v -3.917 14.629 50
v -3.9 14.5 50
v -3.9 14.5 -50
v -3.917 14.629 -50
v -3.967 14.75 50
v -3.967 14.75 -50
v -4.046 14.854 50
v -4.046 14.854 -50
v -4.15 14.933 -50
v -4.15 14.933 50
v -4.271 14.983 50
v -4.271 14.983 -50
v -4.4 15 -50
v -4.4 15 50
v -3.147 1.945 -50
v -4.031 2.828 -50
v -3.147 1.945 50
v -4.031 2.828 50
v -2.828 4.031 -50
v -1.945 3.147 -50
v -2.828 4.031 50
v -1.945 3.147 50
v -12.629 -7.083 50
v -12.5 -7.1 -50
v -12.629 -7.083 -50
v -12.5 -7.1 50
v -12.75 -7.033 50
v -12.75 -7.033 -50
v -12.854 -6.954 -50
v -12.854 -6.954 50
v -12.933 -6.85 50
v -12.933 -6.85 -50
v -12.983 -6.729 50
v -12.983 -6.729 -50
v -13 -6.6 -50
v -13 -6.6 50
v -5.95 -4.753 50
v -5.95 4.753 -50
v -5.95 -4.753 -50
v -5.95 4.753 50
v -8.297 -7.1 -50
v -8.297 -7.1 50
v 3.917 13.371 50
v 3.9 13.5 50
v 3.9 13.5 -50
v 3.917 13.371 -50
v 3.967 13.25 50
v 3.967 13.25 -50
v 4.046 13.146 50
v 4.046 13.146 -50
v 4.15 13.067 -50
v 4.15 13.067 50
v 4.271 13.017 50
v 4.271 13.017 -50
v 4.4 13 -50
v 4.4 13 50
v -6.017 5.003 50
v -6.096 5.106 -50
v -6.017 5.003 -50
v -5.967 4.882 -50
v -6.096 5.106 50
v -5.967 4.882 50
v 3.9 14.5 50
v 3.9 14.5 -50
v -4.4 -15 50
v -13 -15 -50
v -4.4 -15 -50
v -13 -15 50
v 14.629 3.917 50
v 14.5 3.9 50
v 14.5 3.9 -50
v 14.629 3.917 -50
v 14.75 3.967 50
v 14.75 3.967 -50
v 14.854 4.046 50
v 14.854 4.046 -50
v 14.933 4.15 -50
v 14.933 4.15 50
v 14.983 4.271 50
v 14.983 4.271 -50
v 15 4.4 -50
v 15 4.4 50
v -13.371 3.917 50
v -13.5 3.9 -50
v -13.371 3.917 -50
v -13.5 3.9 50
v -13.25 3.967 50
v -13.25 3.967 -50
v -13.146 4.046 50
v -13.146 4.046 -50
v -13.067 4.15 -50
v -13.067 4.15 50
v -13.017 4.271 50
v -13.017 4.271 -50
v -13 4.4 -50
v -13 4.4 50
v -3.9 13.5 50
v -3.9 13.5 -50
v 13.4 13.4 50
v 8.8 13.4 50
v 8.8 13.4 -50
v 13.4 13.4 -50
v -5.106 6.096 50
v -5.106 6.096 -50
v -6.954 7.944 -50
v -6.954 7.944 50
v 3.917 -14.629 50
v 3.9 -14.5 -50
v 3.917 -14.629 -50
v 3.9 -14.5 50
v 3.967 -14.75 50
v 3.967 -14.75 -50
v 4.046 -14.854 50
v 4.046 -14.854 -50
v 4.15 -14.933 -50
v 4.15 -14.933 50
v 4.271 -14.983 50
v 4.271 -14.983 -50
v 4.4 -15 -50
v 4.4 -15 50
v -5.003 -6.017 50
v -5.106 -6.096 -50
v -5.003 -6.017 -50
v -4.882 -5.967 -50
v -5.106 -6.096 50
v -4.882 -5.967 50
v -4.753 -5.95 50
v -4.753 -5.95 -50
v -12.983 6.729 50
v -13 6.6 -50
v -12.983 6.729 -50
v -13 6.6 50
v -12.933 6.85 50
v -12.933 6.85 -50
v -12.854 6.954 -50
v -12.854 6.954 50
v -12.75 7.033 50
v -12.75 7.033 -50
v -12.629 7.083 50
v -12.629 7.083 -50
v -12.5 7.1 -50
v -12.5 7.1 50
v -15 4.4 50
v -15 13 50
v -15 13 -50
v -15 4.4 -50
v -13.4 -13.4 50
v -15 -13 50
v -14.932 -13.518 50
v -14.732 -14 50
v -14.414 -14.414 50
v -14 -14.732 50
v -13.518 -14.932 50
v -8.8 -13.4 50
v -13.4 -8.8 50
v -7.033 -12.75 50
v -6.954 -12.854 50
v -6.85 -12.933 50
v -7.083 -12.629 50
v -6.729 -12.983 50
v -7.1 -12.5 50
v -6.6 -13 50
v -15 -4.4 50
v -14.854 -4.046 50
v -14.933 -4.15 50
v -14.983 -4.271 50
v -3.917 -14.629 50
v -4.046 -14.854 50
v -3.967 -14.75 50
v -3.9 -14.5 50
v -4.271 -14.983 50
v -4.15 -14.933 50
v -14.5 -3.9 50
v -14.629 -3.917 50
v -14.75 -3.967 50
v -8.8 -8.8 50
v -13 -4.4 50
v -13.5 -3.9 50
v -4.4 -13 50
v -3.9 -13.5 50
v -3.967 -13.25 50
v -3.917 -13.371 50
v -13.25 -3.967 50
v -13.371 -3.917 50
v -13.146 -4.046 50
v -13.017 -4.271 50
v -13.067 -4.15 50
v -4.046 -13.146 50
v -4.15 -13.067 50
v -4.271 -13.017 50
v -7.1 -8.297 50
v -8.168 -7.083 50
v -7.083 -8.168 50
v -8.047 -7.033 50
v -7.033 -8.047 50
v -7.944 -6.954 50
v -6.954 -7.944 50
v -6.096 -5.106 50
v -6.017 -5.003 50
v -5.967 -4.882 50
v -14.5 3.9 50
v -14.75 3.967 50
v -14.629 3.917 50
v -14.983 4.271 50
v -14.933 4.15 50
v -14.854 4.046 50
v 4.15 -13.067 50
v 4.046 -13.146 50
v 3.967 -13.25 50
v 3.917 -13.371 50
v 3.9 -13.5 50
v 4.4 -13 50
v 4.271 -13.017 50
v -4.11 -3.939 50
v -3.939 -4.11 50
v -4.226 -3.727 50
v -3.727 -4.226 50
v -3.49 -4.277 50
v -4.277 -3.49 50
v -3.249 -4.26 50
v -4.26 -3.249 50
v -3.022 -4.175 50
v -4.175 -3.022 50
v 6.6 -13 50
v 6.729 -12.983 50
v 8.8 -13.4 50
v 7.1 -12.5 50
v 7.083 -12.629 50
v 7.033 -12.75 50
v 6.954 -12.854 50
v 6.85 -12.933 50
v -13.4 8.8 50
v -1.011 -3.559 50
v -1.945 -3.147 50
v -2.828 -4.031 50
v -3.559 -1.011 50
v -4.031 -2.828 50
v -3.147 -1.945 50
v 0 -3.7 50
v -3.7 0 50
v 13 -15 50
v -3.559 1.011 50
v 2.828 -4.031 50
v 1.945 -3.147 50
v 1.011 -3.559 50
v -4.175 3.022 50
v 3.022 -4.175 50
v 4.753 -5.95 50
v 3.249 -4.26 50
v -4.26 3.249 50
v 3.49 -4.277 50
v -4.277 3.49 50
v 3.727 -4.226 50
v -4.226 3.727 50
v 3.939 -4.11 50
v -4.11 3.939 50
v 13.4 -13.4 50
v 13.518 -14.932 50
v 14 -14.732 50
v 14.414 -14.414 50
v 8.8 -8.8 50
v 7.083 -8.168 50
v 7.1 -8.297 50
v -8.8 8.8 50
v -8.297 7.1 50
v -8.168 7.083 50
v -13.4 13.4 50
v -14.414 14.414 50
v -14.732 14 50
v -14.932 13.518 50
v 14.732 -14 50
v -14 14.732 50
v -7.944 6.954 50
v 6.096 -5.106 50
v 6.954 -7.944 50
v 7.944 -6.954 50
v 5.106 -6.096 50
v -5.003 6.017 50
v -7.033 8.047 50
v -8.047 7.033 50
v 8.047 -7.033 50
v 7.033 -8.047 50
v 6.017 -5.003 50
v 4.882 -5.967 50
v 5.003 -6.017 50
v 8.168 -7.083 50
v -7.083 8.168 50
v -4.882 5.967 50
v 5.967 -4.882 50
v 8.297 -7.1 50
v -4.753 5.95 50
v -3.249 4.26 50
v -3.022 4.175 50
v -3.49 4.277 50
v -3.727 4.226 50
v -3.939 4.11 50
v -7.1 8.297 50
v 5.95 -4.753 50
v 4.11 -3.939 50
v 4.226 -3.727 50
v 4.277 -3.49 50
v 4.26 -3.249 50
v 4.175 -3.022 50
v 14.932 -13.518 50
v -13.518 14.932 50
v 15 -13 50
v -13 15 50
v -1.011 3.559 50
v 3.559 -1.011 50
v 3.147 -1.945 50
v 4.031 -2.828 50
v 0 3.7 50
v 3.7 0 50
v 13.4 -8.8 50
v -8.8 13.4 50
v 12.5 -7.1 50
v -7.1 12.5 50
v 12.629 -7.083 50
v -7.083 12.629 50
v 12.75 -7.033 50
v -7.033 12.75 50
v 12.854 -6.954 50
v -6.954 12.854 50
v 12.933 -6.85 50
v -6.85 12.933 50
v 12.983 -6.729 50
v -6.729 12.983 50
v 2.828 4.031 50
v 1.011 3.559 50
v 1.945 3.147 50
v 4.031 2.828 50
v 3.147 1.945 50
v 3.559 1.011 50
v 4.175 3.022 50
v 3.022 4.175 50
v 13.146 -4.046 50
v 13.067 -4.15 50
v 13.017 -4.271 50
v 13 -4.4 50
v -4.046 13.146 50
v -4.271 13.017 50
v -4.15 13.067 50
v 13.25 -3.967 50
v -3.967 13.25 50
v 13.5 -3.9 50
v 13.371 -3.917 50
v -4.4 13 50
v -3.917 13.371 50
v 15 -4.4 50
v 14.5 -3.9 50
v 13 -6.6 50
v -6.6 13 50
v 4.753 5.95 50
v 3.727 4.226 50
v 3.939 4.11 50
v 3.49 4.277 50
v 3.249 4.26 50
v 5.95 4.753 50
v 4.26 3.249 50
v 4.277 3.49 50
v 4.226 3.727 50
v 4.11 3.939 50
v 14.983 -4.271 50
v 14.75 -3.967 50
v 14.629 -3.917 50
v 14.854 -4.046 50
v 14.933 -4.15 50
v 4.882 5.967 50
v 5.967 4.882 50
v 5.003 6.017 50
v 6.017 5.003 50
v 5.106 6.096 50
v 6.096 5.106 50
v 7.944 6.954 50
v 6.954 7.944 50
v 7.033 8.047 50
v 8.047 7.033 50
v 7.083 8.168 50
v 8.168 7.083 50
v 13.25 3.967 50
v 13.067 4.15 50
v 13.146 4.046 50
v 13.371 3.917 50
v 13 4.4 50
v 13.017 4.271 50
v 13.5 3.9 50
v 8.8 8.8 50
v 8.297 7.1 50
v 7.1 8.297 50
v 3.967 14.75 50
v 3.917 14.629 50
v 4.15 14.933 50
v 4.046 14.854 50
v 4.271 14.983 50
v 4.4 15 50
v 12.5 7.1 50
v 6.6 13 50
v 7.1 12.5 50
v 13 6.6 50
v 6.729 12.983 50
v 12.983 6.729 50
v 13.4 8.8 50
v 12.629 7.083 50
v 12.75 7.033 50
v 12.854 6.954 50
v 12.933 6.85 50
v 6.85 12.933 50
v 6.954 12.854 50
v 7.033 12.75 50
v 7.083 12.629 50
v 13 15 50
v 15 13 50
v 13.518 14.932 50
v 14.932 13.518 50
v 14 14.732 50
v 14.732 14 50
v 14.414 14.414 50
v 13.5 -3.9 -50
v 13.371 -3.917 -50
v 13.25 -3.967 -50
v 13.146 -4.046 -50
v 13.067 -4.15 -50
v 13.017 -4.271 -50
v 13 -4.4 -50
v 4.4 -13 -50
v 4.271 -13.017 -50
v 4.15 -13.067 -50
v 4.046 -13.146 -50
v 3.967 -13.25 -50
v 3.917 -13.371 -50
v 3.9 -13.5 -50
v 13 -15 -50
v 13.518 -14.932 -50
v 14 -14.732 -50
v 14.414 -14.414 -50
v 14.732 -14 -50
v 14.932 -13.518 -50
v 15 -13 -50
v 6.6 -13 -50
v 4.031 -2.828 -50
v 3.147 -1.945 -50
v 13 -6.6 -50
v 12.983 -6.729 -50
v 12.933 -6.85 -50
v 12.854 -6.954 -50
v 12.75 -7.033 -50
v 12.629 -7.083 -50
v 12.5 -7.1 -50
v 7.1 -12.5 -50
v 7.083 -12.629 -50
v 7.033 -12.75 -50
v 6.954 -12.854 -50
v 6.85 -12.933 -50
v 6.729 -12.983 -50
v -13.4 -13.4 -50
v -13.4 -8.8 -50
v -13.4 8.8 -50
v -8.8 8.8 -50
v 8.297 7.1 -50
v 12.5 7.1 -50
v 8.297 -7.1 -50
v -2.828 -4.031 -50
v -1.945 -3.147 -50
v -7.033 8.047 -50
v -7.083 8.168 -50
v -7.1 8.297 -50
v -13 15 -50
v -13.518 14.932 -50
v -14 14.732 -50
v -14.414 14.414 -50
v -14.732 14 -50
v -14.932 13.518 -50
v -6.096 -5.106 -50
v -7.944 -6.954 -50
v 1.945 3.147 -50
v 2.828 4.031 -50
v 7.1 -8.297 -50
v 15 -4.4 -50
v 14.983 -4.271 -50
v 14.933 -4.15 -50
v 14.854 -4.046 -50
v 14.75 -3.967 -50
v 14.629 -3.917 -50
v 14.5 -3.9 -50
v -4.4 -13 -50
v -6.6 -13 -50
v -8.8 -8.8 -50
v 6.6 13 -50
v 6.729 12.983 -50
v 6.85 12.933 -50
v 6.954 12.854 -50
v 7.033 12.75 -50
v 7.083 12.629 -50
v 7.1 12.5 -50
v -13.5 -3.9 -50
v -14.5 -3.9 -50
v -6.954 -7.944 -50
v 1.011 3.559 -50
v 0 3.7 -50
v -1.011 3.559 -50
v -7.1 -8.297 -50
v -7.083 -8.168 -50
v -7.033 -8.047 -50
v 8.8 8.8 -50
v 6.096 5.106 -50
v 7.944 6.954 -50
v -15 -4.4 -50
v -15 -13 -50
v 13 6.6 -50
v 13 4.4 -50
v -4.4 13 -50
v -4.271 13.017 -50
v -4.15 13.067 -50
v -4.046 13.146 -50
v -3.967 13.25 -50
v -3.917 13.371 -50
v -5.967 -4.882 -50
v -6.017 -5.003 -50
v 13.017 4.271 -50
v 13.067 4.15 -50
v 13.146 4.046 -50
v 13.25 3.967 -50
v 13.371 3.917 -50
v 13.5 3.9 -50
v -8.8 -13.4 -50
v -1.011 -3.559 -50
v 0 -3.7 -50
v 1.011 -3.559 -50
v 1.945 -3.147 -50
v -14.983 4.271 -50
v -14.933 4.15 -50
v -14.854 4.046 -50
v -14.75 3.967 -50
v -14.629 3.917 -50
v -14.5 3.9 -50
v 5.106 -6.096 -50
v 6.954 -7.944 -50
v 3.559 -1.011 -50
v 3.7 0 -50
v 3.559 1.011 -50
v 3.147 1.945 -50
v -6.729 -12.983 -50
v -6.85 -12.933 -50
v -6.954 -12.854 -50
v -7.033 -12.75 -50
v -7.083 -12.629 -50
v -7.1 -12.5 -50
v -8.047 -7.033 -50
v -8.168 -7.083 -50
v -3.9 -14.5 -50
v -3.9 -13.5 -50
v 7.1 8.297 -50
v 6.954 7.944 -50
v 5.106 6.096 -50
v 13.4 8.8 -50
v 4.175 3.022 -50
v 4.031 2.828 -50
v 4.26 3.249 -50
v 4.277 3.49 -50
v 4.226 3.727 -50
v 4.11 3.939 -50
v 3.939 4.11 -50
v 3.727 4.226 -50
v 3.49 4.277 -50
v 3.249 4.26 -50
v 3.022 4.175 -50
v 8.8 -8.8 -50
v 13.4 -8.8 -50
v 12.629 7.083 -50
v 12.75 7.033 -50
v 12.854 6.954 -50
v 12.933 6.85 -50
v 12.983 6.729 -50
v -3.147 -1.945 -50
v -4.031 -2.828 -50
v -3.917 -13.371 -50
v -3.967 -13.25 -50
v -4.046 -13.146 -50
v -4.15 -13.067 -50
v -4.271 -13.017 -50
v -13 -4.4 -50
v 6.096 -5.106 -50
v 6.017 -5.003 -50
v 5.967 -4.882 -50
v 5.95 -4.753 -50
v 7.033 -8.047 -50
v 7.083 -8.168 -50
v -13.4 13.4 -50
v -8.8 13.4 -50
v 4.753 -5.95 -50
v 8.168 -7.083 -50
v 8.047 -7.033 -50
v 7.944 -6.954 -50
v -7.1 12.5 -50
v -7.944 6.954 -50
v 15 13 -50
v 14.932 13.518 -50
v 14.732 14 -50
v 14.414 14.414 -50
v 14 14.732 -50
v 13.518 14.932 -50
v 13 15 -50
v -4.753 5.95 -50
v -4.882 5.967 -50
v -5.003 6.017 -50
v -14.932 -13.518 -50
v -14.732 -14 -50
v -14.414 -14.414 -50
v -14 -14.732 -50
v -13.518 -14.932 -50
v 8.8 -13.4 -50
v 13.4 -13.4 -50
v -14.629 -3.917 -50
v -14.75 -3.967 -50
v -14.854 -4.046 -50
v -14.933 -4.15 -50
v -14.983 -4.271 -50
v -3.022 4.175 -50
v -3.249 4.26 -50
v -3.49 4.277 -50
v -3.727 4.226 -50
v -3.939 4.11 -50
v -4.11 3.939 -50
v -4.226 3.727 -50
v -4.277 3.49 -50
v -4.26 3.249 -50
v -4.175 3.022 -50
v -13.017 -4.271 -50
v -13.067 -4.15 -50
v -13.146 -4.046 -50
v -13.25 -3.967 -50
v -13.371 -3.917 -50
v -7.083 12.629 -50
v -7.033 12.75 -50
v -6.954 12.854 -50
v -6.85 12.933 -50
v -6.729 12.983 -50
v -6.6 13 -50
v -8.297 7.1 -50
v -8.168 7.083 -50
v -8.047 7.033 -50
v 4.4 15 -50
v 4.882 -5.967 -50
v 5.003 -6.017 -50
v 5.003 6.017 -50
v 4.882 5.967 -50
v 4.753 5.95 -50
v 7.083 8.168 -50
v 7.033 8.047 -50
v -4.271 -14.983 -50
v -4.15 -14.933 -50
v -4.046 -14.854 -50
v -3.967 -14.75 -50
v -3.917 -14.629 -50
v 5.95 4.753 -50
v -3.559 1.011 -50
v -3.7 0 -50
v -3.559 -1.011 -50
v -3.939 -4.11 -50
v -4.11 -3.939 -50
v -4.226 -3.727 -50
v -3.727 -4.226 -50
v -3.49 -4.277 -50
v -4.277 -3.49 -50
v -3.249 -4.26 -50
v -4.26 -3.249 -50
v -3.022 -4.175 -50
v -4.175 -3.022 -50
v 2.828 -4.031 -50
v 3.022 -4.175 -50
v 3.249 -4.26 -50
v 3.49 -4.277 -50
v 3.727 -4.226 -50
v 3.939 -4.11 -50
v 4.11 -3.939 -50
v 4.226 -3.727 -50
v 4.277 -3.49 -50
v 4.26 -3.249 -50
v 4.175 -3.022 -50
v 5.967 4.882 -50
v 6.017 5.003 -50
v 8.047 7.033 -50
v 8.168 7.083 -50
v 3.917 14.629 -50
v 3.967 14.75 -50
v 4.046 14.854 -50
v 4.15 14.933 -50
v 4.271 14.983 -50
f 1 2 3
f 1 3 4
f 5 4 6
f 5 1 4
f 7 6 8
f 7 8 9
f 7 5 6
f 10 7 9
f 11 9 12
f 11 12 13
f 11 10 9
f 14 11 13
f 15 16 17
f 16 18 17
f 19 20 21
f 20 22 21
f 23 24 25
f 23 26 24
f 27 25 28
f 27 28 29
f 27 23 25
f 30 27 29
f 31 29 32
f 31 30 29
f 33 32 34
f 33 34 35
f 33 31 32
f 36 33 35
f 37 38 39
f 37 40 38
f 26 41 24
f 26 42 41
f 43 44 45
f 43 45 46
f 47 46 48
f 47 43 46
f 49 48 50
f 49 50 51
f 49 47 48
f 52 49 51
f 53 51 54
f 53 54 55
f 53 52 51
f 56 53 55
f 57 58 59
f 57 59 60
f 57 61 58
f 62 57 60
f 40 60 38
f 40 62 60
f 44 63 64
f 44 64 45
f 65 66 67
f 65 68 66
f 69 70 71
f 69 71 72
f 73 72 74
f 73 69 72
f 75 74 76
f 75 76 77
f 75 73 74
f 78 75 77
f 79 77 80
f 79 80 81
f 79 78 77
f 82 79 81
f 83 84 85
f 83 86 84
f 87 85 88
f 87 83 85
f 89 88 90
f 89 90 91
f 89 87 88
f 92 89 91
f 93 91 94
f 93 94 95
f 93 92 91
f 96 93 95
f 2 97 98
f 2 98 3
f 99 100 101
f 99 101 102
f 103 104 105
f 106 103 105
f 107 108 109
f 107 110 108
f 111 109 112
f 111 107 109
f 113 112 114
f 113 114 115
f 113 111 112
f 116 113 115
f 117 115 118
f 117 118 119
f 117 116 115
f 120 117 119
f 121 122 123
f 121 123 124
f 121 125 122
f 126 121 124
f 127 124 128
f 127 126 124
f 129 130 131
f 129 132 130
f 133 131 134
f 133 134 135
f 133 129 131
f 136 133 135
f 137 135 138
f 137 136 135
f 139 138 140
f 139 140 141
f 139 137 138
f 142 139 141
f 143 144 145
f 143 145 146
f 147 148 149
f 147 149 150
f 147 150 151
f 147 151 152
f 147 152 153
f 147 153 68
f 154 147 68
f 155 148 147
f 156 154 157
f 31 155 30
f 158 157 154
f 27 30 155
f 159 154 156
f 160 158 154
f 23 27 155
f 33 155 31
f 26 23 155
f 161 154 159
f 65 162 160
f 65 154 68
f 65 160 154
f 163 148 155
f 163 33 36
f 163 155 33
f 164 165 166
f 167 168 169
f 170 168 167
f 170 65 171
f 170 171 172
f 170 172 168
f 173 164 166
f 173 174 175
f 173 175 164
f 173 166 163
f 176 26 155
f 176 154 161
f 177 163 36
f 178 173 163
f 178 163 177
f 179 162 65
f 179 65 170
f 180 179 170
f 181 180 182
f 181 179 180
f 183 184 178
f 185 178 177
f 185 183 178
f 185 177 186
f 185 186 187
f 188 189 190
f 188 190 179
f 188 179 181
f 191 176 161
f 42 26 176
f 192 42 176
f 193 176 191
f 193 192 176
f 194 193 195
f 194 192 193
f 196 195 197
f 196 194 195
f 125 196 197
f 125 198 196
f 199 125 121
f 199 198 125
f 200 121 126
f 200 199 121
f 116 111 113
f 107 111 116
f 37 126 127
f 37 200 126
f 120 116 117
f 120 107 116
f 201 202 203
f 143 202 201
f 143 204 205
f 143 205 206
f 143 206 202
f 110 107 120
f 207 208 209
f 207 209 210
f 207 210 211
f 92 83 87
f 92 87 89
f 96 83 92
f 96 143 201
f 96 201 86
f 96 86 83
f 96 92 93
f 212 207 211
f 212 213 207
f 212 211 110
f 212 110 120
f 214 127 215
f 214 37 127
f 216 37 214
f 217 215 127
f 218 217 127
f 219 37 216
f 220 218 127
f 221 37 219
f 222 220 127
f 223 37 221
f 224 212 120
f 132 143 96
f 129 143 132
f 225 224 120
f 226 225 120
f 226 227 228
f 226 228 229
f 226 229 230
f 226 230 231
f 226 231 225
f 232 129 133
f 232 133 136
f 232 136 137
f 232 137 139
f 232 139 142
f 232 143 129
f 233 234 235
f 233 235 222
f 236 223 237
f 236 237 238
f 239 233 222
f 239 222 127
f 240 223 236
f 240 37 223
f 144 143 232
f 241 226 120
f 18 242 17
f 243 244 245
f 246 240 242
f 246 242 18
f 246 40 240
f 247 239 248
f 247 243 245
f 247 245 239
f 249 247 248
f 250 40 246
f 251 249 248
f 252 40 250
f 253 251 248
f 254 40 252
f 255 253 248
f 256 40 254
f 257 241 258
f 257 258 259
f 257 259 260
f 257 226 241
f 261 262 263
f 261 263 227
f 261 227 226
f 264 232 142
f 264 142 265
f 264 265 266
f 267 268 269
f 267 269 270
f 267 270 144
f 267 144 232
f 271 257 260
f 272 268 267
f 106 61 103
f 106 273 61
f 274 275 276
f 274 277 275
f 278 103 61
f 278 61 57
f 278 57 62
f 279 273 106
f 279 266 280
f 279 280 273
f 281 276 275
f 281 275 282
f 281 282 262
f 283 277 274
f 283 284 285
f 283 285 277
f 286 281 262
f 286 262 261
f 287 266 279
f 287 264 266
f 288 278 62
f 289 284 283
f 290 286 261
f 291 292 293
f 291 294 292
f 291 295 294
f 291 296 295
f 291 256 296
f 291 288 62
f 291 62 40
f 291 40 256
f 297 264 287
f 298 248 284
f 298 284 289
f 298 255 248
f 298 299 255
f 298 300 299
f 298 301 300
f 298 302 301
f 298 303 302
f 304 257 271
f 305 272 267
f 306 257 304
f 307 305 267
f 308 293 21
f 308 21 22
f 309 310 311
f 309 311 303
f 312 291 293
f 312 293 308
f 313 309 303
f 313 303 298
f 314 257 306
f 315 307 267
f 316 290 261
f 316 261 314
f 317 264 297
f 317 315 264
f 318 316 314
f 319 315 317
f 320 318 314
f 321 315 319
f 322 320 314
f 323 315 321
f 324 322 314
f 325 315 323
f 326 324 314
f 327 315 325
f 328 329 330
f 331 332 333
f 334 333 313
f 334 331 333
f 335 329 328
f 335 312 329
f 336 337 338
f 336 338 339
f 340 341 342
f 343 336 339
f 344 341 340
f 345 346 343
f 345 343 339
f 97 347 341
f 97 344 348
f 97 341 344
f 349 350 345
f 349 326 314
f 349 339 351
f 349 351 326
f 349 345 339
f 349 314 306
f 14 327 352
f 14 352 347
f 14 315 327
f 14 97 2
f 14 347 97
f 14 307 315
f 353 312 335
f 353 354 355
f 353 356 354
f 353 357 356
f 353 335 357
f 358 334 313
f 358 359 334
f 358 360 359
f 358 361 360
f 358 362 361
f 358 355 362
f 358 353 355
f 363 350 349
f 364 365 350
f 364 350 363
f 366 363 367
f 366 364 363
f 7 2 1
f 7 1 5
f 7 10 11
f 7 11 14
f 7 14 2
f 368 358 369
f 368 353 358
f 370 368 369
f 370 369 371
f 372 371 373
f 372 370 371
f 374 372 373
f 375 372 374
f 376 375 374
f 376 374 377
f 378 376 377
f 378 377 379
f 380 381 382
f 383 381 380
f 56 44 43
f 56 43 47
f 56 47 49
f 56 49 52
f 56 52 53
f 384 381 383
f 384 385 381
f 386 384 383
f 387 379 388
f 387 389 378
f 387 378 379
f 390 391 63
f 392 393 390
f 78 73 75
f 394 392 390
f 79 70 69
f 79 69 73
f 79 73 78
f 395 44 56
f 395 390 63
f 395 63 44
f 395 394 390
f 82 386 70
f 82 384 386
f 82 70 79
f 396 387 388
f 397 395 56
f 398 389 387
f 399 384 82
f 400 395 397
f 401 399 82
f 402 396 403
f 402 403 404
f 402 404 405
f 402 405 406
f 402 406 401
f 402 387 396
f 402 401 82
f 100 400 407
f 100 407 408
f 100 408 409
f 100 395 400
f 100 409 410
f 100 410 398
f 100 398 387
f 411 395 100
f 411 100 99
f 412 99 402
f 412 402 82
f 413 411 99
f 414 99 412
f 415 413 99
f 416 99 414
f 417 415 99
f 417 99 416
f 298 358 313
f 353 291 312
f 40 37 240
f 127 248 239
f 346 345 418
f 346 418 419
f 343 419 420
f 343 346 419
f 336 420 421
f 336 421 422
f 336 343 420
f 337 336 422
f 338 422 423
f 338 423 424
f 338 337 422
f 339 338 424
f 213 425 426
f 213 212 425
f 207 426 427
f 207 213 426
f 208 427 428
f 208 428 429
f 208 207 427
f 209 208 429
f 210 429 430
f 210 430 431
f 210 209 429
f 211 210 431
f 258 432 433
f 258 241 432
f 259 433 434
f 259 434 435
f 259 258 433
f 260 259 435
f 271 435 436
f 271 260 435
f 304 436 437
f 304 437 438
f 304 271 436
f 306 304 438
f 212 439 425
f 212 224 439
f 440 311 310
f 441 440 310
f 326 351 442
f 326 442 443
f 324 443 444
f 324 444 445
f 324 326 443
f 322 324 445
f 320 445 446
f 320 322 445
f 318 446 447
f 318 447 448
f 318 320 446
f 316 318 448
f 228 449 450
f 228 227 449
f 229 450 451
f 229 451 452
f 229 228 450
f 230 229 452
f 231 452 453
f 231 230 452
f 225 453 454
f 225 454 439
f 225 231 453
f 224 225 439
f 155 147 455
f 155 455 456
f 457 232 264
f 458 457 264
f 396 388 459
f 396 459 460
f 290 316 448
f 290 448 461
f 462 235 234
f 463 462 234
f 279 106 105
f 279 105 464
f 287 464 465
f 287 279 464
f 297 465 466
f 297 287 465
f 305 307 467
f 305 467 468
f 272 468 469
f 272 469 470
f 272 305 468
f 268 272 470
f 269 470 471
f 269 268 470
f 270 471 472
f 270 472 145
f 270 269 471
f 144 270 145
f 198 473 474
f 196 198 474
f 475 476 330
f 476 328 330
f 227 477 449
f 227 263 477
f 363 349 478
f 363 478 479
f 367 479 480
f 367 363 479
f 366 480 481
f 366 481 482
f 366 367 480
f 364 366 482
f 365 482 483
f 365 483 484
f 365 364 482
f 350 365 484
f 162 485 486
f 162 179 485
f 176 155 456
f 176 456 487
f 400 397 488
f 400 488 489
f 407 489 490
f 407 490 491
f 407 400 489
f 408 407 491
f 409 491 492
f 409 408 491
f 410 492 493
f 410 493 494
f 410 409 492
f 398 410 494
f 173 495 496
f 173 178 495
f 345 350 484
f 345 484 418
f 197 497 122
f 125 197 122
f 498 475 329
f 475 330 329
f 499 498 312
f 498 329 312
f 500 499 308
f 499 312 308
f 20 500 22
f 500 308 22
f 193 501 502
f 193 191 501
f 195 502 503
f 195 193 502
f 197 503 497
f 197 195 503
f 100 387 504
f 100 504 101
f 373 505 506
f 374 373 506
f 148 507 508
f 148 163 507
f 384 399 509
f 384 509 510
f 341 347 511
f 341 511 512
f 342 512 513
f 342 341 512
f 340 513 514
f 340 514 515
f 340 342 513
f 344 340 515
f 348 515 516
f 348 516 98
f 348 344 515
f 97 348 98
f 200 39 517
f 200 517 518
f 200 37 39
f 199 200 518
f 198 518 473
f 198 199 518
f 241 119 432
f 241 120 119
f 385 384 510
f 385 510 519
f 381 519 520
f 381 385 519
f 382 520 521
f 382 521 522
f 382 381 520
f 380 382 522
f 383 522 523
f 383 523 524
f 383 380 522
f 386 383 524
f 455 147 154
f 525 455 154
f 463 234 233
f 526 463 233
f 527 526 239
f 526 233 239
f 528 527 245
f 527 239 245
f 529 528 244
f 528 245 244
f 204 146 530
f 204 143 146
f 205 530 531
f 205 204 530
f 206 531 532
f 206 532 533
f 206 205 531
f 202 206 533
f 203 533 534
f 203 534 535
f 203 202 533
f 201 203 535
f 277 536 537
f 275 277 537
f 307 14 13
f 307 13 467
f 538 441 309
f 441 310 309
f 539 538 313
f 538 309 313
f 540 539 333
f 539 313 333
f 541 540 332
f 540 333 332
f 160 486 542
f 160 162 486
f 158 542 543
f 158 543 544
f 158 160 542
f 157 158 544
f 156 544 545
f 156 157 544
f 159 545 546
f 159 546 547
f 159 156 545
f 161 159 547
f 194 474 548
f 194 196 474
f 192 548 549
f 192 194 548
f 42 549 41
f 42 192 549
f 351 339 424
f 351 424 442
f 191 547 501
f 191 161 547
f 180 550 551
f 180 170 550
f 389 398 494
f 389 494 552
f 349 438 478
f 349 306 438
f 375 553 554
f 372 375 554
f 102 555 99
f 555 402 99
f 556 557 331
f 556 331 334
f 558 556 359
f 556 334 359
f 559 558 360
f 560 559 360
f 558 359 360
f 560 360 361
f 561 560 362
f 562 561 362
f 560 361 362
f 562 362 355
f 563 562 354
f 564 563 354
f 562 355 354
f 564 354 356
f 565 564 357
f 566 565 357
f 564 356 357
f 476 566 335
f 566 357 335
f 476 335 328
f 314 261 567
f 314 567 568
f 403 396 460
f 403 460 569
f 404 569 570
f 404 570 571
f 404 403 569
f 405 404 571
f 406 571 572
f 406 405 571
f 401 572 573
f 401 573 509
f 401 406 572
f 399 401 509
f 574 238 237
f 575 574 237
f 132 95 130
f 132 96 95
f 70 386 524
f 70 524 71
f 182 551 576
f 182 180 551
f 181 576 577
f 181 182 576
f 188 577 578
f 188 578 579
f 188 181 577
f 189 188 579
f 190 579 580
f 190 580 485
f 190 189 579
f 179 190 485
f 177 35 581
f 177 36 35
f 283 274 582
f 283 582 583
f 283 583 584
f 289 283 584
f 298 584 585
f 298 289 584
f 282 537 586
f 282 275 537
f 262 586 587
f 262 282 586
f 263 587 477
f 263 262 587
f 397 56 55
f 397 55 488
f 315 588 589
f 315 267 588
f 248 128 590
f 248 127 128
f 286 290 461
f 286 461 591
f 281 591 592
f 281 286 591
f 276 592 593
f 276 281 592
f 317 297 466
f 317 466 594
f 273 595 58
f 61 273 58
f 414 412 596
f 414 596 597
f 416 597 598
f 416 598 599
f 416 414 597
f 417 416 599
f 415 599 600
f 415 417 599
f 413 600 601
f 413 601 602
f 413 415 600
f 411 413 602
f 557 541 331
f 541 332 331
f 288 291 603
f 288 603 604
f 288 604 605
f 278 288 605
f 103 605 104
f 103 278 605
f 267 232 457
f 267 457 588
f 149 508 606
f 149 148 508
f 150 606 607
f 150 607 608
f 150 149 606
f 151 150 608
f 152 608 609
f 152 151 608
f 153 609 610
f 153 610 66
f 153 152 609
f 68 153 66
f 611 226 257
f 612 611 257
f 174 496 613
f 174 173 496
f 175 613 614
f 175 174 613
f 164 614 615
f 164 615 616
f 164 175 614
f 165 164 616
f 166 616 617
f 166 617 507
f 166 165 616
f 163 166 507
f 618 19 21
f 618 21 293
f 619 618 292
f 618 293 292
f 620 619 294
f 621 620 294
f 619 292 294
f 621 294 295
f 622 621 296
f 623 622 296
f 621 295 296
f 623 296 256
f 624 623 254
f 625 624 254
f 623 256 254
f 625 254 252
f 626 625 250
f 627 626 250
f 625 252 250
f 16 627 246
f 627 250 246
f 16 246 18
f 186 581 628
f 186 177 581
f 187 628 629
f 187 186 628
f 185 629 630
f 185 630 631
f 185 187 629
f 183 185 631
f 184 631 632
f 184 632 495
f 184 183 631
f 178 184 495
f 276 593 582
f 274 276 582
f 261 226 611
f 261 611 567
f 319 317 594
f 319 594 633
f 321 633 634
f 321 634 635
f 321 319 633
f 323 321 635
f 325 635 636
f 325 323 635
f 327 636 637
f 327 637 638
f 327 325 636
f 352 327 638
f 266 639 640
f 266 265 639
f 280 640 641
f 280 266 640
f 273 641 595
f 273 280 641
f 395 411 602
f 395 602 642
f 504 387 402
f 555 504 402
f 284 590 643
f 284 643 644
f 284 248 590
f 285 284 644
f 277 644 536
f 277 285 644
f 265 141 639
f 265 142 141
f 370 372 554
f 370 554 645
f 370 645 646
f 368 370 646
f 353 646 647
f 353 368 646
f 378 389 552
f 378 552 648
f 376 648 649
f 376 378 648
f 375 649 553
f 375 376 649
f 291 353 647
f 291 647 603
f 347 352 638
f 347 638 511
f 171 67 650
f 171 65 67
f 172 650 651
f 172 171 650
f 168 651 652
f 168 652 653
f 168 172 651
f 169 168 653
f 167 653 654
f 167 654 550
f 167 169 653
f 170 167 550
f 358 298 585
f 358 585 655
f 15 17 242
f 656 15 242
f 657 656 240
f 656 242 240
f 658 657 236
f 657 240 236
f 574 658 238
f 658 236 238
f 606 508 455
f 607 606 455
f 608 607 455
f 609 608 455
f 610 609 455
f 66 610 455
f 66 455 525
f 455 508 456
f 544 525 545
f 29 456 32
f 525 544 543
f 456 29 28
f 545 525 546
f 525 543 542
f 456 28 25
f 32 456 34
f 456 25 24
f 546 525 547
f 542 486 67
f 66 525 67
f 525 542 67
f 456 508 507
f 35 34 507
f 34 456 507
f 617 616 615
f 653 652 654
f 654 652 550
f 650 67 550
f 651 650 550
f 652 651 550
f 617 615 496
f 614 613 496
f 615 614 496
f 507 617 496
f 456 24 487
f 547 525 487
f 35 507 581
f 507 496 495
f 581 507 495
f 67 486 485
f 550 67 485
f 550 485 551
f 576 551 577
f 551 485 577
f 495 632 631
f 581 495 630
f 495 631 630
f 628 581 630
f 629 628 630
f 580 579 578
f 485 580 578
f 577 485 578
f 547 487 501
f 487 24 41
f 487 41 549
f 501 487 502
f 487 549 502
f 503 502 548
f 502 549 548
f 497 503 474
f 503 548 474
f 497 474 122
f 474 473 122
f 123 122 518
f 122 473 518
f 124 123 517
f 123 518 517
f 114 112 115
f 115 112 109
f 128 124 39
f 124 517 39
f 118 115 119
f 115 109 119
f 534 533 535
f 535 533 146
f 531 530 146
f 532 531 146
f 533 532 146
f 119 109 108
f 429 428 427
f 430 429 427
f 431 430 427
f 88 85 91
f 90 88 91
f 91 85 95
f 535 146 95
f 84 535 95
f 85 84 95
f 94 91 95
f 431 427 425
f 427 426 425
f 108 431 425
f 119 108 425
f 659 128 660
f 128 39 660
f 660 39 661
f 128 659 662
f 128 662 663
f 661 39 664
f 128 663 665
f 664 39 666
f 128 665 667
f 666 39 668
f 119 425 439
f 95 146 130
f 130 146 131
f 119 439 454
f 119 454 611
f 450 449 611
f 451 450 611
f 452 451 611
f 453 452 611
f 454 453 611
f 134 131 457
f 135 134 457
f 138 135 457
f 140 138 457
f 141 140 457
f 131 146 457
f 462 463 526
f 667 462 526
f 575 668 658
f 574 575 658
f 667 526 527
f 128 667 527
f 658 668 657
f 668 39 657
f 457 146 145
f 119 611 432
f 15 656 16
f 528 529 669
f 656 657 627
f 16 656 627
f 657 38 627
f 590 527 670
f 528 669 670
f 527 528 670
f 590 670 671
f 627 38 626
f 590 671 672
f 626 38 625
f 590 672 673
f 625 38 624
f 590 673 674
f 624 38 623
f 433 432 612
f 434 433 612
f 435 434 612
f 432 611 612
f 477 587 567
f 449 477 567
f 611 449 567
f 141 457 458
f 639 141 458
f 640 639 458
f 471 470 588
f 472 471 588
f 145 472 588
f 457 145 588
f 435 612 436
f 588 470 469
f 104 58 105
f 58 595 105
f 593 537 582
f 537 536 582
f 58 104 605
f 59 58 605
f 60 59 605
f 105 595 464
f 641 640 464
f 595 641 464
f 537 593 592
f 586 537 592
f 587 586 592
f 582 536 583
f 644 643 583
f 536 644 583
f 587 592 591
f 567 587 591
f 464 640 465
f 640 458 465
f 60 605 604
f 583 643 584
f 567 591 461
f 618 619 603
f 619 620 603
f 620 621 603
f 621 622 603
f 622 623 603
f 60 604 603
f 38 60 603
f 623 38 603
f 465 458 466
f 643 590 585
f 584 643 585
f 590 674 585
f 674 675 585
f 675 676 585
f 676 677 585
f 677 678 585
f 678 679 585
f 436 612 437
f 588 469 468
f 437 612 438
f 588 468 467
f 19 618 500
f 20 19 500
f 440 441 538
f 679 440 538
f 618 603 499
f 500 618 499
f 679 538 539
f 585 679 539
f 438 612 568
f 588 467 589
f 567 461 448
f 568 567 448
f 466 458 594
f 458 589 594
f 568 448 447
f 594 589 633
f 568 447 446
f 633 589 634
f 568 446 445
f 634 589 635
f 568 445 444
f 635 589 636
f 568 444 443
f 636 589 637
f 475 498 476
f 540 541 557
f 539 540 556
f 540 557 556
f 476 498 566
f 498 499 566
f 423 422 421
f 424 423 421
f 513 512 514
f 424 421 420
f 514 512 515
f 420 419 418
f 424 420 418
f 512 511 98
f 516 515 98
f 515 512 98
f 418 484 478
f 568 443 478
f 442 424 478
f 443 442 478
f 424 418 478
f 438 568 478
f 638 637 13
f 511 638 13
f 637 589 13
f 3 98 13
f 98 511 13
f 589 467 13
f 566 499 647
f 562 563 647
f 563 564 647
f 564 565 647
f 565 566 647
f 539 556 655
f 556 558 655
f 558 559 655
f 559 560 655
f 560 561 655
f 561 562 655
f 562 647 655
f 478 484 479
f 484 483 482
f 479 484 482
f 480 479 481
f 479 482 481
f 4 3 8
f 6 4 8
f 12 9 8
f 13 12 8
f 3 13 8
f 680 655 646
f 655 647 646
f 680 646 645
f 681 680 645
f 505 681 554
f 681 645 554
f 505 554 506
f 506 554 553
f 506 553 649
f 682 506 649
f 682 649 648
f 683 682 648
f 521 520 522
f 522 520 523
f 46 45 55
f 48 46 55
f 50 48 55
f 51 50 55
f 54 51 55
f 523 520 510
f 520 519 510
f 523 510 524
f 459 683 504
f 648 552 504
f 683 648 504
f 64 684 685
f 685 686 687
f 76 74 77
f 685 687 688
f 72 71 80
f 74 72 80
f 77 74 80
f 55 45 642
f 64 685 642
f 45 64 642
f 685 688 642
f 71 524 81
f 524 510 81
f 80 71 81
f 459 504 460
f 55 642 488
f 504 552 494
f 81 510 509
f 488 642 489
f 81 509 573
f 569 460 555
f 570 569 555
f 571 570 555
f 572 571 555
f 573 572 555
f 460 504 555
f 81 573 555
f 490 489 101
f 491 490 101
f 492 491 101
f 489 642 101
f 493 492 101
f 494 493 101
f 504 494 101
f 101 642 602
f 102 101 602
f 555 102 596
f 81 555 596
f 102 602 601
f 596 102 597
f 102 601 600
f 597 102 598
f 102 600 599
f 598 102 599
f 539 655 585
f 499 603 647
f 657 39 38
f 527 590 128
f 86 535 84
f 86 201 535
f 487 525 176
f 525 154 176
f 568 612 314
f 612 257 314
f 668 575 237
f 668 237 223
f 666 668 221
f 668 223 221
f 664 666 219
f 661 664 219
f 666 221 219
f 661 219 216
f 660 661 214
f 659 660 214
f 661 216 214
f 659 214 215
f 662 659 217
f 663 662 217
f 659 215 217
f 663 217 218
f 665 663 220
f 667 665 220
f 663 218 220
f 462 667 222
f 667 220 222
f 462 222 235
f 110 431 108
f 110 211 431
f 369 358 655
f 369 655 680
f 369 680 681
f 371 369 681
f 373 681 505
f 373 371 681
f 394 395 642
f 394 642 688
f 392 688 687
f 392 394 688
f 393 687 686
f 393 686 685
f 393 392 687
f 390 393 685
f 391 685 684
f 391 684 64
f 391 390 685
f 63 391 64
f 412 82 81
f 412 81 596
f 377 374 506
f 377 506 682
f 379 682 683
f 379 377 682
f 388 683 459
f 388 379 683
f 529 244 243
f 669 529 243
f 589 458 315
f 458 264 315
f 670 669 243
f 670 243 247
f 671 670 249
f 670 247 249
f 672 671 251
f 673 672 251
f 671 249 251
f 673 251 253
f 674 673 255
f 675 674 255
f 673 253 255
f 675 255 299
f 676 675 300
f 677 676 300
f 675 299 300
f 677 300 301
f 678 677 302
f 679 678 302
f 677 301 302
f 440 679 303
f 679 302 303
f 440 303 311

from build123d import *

# Parameters (mm, degrees)
SKETCH1_W           = 4.6
SKETCH1_H           = 4.6
BOSS_EXTRUDE1_DEPTH = 50


with BuildPart() as part:
    # Sketch1 → Boss-Extrude1 (new body, symmetric)
    with BuildSketch(Plane.XY):
        with BuildLine():
            Line((15, -13), (15, -4.4))
            ThreePointArc((15, -4.4), (14.853553391, -4.046446609), (14.5, -3.9))
            Line((14.5, -3.9), (13.5, -3.9))
            ThreePointArc((13.5, -3.9), (13.146446609, -4.046446609), (13, -4.4))
            Line((13, -4.4), (13, -6.6))
            ThreePointArc((13, -6.6), (12.853553391, -6.953553391), (12.5, -7.1))
            Line((12.5, -7.1), (8.297056275, -7.1))
            ThreePointArc((8.297056275, -7.1), (8.105714559, -7.061939766), (7.943502884, -6.953553391))
            Line((7.943502884, -6.953553391), (6.096446609, -5.106497116))
            ThreePointArc((6.096446609, -5.106497116), (5.988060234, -4.944285441), (5.95, -4.752943725))
            Line((5.95, -4.752943725), (5.95, 4.752943725))
            ThreePointArc((5.95, 4.752943725), (5.988060234, 4.944285441), (6.096446609, 5.106497116))
            Line((6.096446609, 5.106497116), (7.943502884, 6.953553391))
            ThreePointArc((7.943502884, 6.953553391), (8.105714559, 7.061939766), (8.297056275, 7.1))
            Line((8.297056275, 7.1), (12.5, 7.1))
            ThreePointArc((12.5, 7.1), (12.853553391, 6.953553391), (13, 6.6))
            Line((13, 6.6), (13, 4.4))
            ThreePointArc((13, 4.4), (13.146446609, 4.046446609), (13.5, 3.9))
            Line((13.5, 3.9), (14.5, 3.9))
            ThreePointArc((14.5, 3.9), (14.853553391, 4.046446609), (15, 4.4))
            Line((15, 4.4), (15, 13))
            ThreePointArc((15, 13), (14.414213562, 14.414213562), (13, 15))
            Line((13, 15), (4.4, 15))
            ThreePointArc((4.4, 15), (4.046446609, 14.853553391), (3.9, 14.5))
            Line((3.9, 14.5), (3.9, 13.5))
            ThreePointArc((3.9, 13.5), (4.046446609, 13.146446609), (4.4, 13))
            Line((4.4, 13), (6.6, 13))
            ThreePointArc((6.6, 13), (6.953553391, 12.853553391), (7.1, 12.5))
            Line((7.1, 12.5), (7.1, 8.297056275))
            ThreePointArc((7.1, 8.297056275), (7.061939766, 8.105714559), (6.953553391, 7.943502884))
            Line((6.953553391, 7.943502884), (5.106497116, 6.096446609))
            ThreePointArc((5.106497116, 6.096446609), (4.944285441, 5.988060234), (4.752943725, 5.95))
            Line((4.752943725, 5.95), (-4.752943725, 5.95))
            ThreePointArc((-4.752943725, 5.95), (-4.944285441, 5.988060234), (-5.106497116, 6.096446609))
            Line((-5.106497116, 6.096446609), (-6.953553391, 7.943502884))
            ThreePointArc((-6.953553391, 7.943502884), (-7.061939766, 8.105714559), (-7.1, 8.297056275))
            Line((-7.1, 8.297056275), (-7.1, 12.5))
            ThreePointArc((-7.1, 12.5), (-6.953553391, 12.853553391), (-6.6, 13))
            Line((-6.6, 13), (-4.4, 13))
            ThreePointArc((-4.4, 13), (-4.046446609, 13.146446609), (-3.9, 13.5))
            Line((-3.9, 13.5), (-3.9, 14.5))
            ThreePointArc((-3.9, 14.5), (-4.046446609, 14.853553391), (-4.4, 15))
            Line((-4.4, 15), (-13, 15))
            ThreePointArc((-13, 15), (-14.414213562, 14.414213562), (-15, 13))
            Line((-15, 13), (-15, 4.4))
            ThreePointArc((-15, 4.4), (-14.853553391, 4.046446609), (-14.5, 3.9))
            Line((-14.5, 3.9), (-13.5, 3.9))
            ThreePointArc((-13.5, 3.9), (-13.146446609, 4.046446609), (-13, 4.4))
            Line((-13, 4.4), (-13, 6.6))
            ThreePointArc((-13, 6.6), (-12.853553391, 6.953553391), (-12.5, 7.1))
            Line((-12.5, 7.1), (-8.297056275, 7.1))
            ThreePointArc((-8.297056275, 7.1), (-8.105714559, 7.061939766), (-7.943502884, 6.953553391))
            Line((-7.943502884, 6.953553391), (-6.096446609, 5.106497116))
            ThreePointArc((-6.096446609, 5.106497116), (-5.988060234, 4.944285441), (-5.95, 4.752943725))
            Line((-5.95, 4.752943725), (-5.95, -4.752943725))
            ThreePointArc((-5.95, -4.752943725), (-5.988060234, -4.944285441), (-6.096446609, -5.106497116))
            Line((-6.096446609, -5.106497116), (-7.943502884, -6.953553391))
            ThreePointArc((-7.943502884, -6.953553391), (-8.105714559, -7.061939766), (-8.297056275, -7.1))
            Line((-8.297056275, -7.1), (-12.5, -7.1))
            ThreePointArc((-12.5, -7.1), (-12.853553391, -6.953553391), (-13, -6.6))
            Line((-13, -6.6), (-13, -4.4))
            ThreePointArc((-13, -4.4), (-13.146446609, -4.046446609), (-13.5, -3.9))
            Line((-13.5, -3.9), (-14.5, -3.9))
            ThreePointArc((-14.5, -3.9), (-14.853553391, -4.046446609), (-15, -4.4))
            Line((-15, -4.4), (-15, -13))
            ThreePointArc((-15, -13), (-14.414213562, -14.414213562), (-13, -15))
            Line((-13, -15), (-4.4, -15))
            ThreePointArc((-4.4, -15), (-4.046446609, -14.853553391), (-3.9, -14.5))
            Line((-3.9, -14.5), (-3.9, -13.5))
            ThreePointArc((-3.9, -13.5), (-4.046446609, -13.146446609), (-4.4, -13))
            Line((-4.4, -13), (-6.6, -13))
            ThreePointArc((-6.6, -13), (-6.953553391, -12.853553391), (-7.1, -12.5))
            Line((-7.1, -12.5), (-7.1, -8.297056275))
            ThreePointArc((-7.1, -8.297056275), (-7.061939766, -8.105714559), (-6.953553391, -7.943502884))
            Line((-6.953553391, -7.943502884), (-5.106497116, -6.096446609))
            ThreePointArc((-5.106497116, -6.096446609), (-4.944285441, -5.988060234), (-4.752943725, -5.95))
            Line((-4.752943725, -5.95), (4.752943725, -5.95))
            ThreePointArc((4.752943725, -5.95), (4.944285441, -5.988060234), (5.106497116, -6.096446609))
            Line((5.106497116, -6.096446609), (6.953553391, -7.943502884))
            ThreePointArc((6.953553391, -7.943502884), (7.061939766, -8.105714559), (7.1, -8.297056275))
            Line((7.1, -8.297056275), (7.1, -12.5))
            ThreePointArc((7.1, -12.5), (6.953553391, -12.853553391), (6.6, -13))
            Line((6.6, -13), (4.4, -13))
            ThreePointArc((4.4, -13), (4.046446609, -13.146446609), (3.9, -13.5))
            Line((3.9, -13.5), (3.9, -14.5))
            ThreePointArc((3.9, -14.5), (4.046446609, -14.853553391), (4.4, -15))
            Line((4.4, -15), (13, -15))
            ThreePointArc((13, -15), (14.414213562, -14.414213562), (15, -13))
        make_face()
        with Locations((-11.1, -11.1)):
            Rectangle(SKETCH1_W, SKETCH1_H, mode=Mode.SUBTRACT)
        with Locations((11.1, -11.1)):
            Rectangle(SKETCH1_W, SKETCH1_H, mode=Mode.SUBTRACT)
        with Locations((11.1, 11.1)):
            Rectangle(SKETCH1_W, SKETCH1_H, mode=Mode.SUBTRACT)
        with BuildLine():
            Line((4.030508653, -2.828427125), (3.147361639, -1.945280111))
            ThreePointArc((3.147361639, -1.945280111), (3.7, 0), (3.147361639, 1.945280111))
            Line((3.147361639, 1.945280111), (4.030508653, 2.828427125))
            ThreePointArc((4.030508653, 2.828427125), (4.030508653, 4.030508653), (2.828427125, 4.030508653))
            Line((2.828427125, 4.030508653), (1.945280111, 3.147361639))
            ThreePointArc((1.945280111, 3.147361639), (0, 3.7), (-1.945280111, 3.147361639))
            Line((-1.945280111, 3.147361639), (-2.828427125, 4.030508653))
            ThreePointArc((-2.828427125, 4.030508653), (-4.030508653, 4.030508653), (-4.030508653, 2.828427125))
            Line((-4.030508653, 2.828427125), (-3.147361639, 1.945280111))
            ThreePointArc((-3.147361639, 1.945280111), (-3.7, 0), (-3.147361639, -1.945280111))
            Line((-3.147361639, -1.945280111), (-4.030508653, -2.828427125))
            ThreePointArc((-4.030508653, -2.828427125), (-4.030508653, -4.030508653), (-2.828427125, -4.030508653))
            Line((-2.828427125, -4.030508653), (-1.945280111, -3.147361639))
            ThreePointArc((-1.945280111, -3.147361639), (0, -3.7), (1.945280111, -3.147361639))
            Line((1.945280111, -3.147361639), (2.828427125, -4.030508653))
            ThreePointArc((2.828427125, -4.030508653), (4.030508653, -4.030508653), (4.030508653, -2.828427125))
        make_face(mode=Mode.SUBTRACT)
        with Locations((-11.1, 11.1)):
            Rectangle(SKETCH1_W, SKETCH1_H, mode=Mode.SUBTRACT)
    extrude(amount=BOSS_EXTRUDE1_DEPTH, both=True)


solid = part.part
